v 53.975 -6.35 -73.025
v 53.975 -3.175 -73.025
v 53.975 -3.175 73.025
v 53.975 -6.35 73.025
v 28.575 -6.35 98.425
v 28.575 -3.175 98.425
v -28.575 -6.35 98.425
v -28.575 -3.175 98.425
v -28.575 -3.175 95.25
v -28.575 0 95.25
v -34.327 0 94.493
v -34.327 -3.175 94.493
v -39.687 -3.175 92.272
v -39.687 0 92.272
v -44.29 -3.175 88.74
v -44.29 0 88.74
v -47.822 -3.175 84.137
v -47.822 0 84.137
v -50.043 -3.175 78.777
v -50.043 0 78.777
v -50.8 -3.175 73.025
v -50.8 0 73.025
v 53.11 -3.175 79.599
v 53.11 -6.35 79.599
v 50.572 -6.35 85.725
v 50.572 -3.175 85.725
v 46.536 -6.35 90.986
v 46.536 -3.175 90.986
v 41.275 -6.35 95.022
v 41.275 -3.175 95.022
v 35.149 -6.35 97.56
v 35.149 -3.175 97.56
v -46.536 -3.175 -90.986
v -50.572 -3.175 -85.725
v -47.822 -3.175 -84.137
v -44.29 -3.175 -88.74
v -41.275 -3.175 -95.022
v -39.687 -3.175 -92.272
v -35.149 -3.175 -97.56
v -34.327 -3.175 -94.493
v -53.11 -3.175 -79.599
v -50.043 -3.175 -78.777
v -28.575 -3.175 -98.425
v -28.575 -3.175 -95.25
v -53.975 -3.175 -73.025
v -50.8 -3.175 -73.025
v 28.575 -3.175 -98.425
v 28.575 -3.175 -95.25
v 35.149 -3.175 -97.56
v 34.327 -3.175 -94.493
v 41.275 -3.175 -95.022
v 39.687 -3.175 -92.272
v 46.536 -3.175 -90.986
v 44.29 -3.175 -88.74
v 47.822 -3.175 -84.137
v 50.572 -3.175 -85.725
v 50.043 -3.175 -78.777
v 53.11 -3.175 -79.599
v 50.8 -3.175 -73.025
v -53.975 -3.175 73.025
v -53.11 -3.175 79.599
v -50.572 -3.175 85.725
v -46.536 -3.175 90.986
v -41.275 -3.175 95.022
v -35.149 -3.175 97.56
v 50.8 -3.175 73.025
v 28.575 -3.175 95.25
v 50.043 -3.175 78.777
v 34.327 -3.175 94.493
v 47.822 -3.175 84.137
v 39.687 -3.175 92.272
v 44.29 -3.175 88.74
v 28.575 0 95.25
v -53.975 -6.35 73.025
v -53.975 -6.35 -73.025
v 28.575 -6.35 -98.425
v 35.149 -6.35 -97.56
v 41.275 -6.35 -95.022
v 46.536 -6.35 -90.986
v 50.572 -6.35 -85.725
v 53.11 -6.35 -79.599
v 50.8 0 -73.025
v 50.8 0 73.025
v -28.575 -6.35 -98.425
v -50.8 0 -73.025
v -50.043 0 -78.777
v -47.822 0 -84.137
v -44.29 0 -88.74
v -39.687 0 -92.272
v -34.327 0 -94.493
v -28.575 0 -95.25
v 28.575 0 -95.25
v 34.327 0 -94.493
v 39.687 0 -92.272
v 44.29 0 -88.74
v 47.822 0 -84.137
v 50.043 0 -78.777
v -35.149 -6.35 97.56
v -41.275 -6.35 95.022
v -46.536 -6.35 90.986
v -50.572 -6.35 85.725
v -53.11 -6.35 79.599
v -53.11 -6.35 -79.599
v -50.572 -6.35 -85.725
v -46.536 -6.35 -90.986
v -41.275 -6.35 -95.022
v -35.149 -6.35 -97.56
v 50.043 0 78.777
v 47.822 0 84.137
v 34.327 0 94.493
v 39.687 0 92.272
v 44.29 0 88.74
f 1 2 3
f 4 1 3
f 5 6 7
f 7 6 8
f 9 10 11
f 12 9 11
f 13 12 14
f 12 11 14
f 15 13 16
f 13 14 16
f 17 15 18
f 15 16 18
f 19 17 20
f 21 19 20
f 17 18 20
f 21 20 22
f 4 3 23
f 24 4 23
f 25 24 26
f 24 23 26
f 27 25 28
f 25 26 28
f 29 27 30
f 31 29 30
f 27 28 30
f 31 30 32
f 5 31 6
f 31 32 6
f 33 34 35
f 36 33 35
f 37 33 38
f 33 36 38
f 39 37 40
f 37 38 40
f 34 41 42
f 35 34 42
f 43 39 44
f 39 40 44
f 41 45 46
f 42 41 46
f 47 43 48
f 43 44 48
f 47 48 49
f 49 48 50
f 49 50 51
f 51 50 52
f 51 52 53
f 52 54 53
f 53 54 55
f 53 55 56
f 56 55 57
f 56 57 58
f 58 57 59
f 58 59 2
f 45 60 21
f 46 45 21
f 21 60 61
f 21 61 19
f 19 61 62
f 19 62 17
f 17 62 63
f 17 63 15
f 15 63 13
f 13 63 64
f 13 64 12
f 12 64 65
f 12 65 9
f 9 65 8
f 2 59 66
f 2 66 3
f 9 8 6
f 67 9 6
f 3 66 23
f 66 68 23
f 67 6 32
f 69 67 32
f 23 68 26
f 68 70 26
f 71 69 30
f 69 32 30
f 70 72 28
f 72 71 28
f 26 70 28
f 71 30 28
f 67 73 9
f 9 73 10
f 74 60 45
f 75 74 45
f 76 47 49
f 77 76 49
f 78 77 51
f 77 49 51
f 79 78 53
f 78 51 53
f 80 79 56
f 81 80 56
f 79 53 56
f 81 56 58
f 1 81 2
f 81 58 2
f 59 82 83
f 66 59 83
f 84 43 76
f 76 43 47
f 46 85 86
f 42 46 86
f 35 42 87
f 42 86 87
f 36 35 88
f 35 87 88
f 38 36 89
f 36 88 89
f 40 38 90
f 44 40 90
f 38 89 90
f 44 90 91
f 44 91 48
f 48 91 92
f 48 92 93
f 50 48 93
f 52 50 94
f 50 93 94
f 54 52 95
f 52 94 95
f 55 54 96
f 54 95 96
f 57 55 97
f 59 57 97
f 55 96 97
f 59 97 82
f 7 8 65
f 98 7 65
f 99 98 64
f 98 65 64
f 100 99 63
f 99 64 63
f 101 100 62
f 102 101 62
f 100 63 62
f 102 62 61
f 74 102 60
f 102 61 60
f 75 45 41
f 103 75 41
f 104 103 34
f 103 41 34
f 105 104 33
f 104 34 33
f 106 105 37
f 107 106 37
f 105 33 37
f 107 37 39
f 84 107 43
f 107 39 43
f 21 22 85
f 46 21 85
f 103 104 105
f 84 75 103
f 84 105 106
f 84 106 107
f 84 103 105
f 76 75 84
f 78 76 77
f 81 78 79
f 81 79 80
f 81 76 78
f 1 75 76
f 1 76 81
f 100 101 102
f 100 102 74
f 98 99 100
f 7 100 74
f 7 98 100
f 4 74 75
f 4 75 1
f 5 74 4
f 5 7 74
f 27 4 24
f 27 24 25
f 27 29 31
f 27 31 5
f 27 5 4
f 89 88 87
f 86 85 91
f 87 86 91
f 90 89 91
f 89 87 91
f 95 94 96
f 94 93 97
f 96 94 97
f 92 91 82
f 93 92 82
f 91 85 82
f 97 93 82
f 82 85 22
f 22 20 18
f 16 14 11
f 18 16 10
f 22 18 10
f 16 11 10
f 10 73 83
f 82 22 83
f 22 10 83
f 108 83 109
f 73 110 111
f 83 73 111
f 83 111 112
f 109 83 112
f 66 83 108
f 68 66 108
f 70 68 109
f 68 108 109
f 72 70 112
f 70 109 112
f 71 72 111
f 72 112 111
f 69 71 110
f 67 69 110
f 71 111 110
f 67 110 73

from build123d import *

# Parameters (mm, degrees)
F1_DEPTH = 3.175
F3_DEPTH = 3.175


with BuildPart() as f1:
    # F0 (on Front) → F1 (new body)
    with BuildSketch(Plane.XZ):
        with BuildLine():
            Line((50.8, -73.025), (50.8, 73.025))
            ThreePointArc((50.8, 73.025), (44.290448, 88.740448), (28.575, 95.25))
            Line((28.575, 95.25), (-28.575, 95.25))
            ThreePointArc((-28.575, 95.25), (-44.290448, 88.740448), (-50.8, 73.025))
            Line((-50.8, 73.025), (-50.8, -73.025))
            ThreePointArc((-50.8, -73.025), (-44.290448, -88.740448), (-28.575, -95.25))
            Line((-28.575, -95.25), (28.575, -95.25))
            ThreePointArc((28.575, -95.25), (44.290448, -88.740448), (50.8, -73.025))
        make_face()
    extrude(amount=F1_DEPTH)

    # F2 (on face) → F3 (join)
    with BuildSketch(Plane.XZ.offset(3.175)):
        with BuildLine():
            Line((-53.975, 73.025), (-53.975, -73.025))
            ThreePointArc((-53.975, -73.025), (-46.535512, -90.985512), (-28.575, -98.425))
            Line((-28.575, -98.425), (28.575, -98.425))
            ThreePointArc((28.575, -98.425), (46.535512, -90.985512), (53.975, -73.025))
            Line((53.975, -73.025), (53.975, 73.025))
            ThreePointArc((53.975, 73.025), (46.535512, 90.985512), (28.575, 98.425))
            Line((28.575, 98.425), (-28.575, 98.425))
            ThreePointArc((-28.575, 98.425), (-46.535512, 90.985512), (-53.975, 73.025))
        make_face()
    extrude(amount=F3_DEPTH)


solid = f1.part
